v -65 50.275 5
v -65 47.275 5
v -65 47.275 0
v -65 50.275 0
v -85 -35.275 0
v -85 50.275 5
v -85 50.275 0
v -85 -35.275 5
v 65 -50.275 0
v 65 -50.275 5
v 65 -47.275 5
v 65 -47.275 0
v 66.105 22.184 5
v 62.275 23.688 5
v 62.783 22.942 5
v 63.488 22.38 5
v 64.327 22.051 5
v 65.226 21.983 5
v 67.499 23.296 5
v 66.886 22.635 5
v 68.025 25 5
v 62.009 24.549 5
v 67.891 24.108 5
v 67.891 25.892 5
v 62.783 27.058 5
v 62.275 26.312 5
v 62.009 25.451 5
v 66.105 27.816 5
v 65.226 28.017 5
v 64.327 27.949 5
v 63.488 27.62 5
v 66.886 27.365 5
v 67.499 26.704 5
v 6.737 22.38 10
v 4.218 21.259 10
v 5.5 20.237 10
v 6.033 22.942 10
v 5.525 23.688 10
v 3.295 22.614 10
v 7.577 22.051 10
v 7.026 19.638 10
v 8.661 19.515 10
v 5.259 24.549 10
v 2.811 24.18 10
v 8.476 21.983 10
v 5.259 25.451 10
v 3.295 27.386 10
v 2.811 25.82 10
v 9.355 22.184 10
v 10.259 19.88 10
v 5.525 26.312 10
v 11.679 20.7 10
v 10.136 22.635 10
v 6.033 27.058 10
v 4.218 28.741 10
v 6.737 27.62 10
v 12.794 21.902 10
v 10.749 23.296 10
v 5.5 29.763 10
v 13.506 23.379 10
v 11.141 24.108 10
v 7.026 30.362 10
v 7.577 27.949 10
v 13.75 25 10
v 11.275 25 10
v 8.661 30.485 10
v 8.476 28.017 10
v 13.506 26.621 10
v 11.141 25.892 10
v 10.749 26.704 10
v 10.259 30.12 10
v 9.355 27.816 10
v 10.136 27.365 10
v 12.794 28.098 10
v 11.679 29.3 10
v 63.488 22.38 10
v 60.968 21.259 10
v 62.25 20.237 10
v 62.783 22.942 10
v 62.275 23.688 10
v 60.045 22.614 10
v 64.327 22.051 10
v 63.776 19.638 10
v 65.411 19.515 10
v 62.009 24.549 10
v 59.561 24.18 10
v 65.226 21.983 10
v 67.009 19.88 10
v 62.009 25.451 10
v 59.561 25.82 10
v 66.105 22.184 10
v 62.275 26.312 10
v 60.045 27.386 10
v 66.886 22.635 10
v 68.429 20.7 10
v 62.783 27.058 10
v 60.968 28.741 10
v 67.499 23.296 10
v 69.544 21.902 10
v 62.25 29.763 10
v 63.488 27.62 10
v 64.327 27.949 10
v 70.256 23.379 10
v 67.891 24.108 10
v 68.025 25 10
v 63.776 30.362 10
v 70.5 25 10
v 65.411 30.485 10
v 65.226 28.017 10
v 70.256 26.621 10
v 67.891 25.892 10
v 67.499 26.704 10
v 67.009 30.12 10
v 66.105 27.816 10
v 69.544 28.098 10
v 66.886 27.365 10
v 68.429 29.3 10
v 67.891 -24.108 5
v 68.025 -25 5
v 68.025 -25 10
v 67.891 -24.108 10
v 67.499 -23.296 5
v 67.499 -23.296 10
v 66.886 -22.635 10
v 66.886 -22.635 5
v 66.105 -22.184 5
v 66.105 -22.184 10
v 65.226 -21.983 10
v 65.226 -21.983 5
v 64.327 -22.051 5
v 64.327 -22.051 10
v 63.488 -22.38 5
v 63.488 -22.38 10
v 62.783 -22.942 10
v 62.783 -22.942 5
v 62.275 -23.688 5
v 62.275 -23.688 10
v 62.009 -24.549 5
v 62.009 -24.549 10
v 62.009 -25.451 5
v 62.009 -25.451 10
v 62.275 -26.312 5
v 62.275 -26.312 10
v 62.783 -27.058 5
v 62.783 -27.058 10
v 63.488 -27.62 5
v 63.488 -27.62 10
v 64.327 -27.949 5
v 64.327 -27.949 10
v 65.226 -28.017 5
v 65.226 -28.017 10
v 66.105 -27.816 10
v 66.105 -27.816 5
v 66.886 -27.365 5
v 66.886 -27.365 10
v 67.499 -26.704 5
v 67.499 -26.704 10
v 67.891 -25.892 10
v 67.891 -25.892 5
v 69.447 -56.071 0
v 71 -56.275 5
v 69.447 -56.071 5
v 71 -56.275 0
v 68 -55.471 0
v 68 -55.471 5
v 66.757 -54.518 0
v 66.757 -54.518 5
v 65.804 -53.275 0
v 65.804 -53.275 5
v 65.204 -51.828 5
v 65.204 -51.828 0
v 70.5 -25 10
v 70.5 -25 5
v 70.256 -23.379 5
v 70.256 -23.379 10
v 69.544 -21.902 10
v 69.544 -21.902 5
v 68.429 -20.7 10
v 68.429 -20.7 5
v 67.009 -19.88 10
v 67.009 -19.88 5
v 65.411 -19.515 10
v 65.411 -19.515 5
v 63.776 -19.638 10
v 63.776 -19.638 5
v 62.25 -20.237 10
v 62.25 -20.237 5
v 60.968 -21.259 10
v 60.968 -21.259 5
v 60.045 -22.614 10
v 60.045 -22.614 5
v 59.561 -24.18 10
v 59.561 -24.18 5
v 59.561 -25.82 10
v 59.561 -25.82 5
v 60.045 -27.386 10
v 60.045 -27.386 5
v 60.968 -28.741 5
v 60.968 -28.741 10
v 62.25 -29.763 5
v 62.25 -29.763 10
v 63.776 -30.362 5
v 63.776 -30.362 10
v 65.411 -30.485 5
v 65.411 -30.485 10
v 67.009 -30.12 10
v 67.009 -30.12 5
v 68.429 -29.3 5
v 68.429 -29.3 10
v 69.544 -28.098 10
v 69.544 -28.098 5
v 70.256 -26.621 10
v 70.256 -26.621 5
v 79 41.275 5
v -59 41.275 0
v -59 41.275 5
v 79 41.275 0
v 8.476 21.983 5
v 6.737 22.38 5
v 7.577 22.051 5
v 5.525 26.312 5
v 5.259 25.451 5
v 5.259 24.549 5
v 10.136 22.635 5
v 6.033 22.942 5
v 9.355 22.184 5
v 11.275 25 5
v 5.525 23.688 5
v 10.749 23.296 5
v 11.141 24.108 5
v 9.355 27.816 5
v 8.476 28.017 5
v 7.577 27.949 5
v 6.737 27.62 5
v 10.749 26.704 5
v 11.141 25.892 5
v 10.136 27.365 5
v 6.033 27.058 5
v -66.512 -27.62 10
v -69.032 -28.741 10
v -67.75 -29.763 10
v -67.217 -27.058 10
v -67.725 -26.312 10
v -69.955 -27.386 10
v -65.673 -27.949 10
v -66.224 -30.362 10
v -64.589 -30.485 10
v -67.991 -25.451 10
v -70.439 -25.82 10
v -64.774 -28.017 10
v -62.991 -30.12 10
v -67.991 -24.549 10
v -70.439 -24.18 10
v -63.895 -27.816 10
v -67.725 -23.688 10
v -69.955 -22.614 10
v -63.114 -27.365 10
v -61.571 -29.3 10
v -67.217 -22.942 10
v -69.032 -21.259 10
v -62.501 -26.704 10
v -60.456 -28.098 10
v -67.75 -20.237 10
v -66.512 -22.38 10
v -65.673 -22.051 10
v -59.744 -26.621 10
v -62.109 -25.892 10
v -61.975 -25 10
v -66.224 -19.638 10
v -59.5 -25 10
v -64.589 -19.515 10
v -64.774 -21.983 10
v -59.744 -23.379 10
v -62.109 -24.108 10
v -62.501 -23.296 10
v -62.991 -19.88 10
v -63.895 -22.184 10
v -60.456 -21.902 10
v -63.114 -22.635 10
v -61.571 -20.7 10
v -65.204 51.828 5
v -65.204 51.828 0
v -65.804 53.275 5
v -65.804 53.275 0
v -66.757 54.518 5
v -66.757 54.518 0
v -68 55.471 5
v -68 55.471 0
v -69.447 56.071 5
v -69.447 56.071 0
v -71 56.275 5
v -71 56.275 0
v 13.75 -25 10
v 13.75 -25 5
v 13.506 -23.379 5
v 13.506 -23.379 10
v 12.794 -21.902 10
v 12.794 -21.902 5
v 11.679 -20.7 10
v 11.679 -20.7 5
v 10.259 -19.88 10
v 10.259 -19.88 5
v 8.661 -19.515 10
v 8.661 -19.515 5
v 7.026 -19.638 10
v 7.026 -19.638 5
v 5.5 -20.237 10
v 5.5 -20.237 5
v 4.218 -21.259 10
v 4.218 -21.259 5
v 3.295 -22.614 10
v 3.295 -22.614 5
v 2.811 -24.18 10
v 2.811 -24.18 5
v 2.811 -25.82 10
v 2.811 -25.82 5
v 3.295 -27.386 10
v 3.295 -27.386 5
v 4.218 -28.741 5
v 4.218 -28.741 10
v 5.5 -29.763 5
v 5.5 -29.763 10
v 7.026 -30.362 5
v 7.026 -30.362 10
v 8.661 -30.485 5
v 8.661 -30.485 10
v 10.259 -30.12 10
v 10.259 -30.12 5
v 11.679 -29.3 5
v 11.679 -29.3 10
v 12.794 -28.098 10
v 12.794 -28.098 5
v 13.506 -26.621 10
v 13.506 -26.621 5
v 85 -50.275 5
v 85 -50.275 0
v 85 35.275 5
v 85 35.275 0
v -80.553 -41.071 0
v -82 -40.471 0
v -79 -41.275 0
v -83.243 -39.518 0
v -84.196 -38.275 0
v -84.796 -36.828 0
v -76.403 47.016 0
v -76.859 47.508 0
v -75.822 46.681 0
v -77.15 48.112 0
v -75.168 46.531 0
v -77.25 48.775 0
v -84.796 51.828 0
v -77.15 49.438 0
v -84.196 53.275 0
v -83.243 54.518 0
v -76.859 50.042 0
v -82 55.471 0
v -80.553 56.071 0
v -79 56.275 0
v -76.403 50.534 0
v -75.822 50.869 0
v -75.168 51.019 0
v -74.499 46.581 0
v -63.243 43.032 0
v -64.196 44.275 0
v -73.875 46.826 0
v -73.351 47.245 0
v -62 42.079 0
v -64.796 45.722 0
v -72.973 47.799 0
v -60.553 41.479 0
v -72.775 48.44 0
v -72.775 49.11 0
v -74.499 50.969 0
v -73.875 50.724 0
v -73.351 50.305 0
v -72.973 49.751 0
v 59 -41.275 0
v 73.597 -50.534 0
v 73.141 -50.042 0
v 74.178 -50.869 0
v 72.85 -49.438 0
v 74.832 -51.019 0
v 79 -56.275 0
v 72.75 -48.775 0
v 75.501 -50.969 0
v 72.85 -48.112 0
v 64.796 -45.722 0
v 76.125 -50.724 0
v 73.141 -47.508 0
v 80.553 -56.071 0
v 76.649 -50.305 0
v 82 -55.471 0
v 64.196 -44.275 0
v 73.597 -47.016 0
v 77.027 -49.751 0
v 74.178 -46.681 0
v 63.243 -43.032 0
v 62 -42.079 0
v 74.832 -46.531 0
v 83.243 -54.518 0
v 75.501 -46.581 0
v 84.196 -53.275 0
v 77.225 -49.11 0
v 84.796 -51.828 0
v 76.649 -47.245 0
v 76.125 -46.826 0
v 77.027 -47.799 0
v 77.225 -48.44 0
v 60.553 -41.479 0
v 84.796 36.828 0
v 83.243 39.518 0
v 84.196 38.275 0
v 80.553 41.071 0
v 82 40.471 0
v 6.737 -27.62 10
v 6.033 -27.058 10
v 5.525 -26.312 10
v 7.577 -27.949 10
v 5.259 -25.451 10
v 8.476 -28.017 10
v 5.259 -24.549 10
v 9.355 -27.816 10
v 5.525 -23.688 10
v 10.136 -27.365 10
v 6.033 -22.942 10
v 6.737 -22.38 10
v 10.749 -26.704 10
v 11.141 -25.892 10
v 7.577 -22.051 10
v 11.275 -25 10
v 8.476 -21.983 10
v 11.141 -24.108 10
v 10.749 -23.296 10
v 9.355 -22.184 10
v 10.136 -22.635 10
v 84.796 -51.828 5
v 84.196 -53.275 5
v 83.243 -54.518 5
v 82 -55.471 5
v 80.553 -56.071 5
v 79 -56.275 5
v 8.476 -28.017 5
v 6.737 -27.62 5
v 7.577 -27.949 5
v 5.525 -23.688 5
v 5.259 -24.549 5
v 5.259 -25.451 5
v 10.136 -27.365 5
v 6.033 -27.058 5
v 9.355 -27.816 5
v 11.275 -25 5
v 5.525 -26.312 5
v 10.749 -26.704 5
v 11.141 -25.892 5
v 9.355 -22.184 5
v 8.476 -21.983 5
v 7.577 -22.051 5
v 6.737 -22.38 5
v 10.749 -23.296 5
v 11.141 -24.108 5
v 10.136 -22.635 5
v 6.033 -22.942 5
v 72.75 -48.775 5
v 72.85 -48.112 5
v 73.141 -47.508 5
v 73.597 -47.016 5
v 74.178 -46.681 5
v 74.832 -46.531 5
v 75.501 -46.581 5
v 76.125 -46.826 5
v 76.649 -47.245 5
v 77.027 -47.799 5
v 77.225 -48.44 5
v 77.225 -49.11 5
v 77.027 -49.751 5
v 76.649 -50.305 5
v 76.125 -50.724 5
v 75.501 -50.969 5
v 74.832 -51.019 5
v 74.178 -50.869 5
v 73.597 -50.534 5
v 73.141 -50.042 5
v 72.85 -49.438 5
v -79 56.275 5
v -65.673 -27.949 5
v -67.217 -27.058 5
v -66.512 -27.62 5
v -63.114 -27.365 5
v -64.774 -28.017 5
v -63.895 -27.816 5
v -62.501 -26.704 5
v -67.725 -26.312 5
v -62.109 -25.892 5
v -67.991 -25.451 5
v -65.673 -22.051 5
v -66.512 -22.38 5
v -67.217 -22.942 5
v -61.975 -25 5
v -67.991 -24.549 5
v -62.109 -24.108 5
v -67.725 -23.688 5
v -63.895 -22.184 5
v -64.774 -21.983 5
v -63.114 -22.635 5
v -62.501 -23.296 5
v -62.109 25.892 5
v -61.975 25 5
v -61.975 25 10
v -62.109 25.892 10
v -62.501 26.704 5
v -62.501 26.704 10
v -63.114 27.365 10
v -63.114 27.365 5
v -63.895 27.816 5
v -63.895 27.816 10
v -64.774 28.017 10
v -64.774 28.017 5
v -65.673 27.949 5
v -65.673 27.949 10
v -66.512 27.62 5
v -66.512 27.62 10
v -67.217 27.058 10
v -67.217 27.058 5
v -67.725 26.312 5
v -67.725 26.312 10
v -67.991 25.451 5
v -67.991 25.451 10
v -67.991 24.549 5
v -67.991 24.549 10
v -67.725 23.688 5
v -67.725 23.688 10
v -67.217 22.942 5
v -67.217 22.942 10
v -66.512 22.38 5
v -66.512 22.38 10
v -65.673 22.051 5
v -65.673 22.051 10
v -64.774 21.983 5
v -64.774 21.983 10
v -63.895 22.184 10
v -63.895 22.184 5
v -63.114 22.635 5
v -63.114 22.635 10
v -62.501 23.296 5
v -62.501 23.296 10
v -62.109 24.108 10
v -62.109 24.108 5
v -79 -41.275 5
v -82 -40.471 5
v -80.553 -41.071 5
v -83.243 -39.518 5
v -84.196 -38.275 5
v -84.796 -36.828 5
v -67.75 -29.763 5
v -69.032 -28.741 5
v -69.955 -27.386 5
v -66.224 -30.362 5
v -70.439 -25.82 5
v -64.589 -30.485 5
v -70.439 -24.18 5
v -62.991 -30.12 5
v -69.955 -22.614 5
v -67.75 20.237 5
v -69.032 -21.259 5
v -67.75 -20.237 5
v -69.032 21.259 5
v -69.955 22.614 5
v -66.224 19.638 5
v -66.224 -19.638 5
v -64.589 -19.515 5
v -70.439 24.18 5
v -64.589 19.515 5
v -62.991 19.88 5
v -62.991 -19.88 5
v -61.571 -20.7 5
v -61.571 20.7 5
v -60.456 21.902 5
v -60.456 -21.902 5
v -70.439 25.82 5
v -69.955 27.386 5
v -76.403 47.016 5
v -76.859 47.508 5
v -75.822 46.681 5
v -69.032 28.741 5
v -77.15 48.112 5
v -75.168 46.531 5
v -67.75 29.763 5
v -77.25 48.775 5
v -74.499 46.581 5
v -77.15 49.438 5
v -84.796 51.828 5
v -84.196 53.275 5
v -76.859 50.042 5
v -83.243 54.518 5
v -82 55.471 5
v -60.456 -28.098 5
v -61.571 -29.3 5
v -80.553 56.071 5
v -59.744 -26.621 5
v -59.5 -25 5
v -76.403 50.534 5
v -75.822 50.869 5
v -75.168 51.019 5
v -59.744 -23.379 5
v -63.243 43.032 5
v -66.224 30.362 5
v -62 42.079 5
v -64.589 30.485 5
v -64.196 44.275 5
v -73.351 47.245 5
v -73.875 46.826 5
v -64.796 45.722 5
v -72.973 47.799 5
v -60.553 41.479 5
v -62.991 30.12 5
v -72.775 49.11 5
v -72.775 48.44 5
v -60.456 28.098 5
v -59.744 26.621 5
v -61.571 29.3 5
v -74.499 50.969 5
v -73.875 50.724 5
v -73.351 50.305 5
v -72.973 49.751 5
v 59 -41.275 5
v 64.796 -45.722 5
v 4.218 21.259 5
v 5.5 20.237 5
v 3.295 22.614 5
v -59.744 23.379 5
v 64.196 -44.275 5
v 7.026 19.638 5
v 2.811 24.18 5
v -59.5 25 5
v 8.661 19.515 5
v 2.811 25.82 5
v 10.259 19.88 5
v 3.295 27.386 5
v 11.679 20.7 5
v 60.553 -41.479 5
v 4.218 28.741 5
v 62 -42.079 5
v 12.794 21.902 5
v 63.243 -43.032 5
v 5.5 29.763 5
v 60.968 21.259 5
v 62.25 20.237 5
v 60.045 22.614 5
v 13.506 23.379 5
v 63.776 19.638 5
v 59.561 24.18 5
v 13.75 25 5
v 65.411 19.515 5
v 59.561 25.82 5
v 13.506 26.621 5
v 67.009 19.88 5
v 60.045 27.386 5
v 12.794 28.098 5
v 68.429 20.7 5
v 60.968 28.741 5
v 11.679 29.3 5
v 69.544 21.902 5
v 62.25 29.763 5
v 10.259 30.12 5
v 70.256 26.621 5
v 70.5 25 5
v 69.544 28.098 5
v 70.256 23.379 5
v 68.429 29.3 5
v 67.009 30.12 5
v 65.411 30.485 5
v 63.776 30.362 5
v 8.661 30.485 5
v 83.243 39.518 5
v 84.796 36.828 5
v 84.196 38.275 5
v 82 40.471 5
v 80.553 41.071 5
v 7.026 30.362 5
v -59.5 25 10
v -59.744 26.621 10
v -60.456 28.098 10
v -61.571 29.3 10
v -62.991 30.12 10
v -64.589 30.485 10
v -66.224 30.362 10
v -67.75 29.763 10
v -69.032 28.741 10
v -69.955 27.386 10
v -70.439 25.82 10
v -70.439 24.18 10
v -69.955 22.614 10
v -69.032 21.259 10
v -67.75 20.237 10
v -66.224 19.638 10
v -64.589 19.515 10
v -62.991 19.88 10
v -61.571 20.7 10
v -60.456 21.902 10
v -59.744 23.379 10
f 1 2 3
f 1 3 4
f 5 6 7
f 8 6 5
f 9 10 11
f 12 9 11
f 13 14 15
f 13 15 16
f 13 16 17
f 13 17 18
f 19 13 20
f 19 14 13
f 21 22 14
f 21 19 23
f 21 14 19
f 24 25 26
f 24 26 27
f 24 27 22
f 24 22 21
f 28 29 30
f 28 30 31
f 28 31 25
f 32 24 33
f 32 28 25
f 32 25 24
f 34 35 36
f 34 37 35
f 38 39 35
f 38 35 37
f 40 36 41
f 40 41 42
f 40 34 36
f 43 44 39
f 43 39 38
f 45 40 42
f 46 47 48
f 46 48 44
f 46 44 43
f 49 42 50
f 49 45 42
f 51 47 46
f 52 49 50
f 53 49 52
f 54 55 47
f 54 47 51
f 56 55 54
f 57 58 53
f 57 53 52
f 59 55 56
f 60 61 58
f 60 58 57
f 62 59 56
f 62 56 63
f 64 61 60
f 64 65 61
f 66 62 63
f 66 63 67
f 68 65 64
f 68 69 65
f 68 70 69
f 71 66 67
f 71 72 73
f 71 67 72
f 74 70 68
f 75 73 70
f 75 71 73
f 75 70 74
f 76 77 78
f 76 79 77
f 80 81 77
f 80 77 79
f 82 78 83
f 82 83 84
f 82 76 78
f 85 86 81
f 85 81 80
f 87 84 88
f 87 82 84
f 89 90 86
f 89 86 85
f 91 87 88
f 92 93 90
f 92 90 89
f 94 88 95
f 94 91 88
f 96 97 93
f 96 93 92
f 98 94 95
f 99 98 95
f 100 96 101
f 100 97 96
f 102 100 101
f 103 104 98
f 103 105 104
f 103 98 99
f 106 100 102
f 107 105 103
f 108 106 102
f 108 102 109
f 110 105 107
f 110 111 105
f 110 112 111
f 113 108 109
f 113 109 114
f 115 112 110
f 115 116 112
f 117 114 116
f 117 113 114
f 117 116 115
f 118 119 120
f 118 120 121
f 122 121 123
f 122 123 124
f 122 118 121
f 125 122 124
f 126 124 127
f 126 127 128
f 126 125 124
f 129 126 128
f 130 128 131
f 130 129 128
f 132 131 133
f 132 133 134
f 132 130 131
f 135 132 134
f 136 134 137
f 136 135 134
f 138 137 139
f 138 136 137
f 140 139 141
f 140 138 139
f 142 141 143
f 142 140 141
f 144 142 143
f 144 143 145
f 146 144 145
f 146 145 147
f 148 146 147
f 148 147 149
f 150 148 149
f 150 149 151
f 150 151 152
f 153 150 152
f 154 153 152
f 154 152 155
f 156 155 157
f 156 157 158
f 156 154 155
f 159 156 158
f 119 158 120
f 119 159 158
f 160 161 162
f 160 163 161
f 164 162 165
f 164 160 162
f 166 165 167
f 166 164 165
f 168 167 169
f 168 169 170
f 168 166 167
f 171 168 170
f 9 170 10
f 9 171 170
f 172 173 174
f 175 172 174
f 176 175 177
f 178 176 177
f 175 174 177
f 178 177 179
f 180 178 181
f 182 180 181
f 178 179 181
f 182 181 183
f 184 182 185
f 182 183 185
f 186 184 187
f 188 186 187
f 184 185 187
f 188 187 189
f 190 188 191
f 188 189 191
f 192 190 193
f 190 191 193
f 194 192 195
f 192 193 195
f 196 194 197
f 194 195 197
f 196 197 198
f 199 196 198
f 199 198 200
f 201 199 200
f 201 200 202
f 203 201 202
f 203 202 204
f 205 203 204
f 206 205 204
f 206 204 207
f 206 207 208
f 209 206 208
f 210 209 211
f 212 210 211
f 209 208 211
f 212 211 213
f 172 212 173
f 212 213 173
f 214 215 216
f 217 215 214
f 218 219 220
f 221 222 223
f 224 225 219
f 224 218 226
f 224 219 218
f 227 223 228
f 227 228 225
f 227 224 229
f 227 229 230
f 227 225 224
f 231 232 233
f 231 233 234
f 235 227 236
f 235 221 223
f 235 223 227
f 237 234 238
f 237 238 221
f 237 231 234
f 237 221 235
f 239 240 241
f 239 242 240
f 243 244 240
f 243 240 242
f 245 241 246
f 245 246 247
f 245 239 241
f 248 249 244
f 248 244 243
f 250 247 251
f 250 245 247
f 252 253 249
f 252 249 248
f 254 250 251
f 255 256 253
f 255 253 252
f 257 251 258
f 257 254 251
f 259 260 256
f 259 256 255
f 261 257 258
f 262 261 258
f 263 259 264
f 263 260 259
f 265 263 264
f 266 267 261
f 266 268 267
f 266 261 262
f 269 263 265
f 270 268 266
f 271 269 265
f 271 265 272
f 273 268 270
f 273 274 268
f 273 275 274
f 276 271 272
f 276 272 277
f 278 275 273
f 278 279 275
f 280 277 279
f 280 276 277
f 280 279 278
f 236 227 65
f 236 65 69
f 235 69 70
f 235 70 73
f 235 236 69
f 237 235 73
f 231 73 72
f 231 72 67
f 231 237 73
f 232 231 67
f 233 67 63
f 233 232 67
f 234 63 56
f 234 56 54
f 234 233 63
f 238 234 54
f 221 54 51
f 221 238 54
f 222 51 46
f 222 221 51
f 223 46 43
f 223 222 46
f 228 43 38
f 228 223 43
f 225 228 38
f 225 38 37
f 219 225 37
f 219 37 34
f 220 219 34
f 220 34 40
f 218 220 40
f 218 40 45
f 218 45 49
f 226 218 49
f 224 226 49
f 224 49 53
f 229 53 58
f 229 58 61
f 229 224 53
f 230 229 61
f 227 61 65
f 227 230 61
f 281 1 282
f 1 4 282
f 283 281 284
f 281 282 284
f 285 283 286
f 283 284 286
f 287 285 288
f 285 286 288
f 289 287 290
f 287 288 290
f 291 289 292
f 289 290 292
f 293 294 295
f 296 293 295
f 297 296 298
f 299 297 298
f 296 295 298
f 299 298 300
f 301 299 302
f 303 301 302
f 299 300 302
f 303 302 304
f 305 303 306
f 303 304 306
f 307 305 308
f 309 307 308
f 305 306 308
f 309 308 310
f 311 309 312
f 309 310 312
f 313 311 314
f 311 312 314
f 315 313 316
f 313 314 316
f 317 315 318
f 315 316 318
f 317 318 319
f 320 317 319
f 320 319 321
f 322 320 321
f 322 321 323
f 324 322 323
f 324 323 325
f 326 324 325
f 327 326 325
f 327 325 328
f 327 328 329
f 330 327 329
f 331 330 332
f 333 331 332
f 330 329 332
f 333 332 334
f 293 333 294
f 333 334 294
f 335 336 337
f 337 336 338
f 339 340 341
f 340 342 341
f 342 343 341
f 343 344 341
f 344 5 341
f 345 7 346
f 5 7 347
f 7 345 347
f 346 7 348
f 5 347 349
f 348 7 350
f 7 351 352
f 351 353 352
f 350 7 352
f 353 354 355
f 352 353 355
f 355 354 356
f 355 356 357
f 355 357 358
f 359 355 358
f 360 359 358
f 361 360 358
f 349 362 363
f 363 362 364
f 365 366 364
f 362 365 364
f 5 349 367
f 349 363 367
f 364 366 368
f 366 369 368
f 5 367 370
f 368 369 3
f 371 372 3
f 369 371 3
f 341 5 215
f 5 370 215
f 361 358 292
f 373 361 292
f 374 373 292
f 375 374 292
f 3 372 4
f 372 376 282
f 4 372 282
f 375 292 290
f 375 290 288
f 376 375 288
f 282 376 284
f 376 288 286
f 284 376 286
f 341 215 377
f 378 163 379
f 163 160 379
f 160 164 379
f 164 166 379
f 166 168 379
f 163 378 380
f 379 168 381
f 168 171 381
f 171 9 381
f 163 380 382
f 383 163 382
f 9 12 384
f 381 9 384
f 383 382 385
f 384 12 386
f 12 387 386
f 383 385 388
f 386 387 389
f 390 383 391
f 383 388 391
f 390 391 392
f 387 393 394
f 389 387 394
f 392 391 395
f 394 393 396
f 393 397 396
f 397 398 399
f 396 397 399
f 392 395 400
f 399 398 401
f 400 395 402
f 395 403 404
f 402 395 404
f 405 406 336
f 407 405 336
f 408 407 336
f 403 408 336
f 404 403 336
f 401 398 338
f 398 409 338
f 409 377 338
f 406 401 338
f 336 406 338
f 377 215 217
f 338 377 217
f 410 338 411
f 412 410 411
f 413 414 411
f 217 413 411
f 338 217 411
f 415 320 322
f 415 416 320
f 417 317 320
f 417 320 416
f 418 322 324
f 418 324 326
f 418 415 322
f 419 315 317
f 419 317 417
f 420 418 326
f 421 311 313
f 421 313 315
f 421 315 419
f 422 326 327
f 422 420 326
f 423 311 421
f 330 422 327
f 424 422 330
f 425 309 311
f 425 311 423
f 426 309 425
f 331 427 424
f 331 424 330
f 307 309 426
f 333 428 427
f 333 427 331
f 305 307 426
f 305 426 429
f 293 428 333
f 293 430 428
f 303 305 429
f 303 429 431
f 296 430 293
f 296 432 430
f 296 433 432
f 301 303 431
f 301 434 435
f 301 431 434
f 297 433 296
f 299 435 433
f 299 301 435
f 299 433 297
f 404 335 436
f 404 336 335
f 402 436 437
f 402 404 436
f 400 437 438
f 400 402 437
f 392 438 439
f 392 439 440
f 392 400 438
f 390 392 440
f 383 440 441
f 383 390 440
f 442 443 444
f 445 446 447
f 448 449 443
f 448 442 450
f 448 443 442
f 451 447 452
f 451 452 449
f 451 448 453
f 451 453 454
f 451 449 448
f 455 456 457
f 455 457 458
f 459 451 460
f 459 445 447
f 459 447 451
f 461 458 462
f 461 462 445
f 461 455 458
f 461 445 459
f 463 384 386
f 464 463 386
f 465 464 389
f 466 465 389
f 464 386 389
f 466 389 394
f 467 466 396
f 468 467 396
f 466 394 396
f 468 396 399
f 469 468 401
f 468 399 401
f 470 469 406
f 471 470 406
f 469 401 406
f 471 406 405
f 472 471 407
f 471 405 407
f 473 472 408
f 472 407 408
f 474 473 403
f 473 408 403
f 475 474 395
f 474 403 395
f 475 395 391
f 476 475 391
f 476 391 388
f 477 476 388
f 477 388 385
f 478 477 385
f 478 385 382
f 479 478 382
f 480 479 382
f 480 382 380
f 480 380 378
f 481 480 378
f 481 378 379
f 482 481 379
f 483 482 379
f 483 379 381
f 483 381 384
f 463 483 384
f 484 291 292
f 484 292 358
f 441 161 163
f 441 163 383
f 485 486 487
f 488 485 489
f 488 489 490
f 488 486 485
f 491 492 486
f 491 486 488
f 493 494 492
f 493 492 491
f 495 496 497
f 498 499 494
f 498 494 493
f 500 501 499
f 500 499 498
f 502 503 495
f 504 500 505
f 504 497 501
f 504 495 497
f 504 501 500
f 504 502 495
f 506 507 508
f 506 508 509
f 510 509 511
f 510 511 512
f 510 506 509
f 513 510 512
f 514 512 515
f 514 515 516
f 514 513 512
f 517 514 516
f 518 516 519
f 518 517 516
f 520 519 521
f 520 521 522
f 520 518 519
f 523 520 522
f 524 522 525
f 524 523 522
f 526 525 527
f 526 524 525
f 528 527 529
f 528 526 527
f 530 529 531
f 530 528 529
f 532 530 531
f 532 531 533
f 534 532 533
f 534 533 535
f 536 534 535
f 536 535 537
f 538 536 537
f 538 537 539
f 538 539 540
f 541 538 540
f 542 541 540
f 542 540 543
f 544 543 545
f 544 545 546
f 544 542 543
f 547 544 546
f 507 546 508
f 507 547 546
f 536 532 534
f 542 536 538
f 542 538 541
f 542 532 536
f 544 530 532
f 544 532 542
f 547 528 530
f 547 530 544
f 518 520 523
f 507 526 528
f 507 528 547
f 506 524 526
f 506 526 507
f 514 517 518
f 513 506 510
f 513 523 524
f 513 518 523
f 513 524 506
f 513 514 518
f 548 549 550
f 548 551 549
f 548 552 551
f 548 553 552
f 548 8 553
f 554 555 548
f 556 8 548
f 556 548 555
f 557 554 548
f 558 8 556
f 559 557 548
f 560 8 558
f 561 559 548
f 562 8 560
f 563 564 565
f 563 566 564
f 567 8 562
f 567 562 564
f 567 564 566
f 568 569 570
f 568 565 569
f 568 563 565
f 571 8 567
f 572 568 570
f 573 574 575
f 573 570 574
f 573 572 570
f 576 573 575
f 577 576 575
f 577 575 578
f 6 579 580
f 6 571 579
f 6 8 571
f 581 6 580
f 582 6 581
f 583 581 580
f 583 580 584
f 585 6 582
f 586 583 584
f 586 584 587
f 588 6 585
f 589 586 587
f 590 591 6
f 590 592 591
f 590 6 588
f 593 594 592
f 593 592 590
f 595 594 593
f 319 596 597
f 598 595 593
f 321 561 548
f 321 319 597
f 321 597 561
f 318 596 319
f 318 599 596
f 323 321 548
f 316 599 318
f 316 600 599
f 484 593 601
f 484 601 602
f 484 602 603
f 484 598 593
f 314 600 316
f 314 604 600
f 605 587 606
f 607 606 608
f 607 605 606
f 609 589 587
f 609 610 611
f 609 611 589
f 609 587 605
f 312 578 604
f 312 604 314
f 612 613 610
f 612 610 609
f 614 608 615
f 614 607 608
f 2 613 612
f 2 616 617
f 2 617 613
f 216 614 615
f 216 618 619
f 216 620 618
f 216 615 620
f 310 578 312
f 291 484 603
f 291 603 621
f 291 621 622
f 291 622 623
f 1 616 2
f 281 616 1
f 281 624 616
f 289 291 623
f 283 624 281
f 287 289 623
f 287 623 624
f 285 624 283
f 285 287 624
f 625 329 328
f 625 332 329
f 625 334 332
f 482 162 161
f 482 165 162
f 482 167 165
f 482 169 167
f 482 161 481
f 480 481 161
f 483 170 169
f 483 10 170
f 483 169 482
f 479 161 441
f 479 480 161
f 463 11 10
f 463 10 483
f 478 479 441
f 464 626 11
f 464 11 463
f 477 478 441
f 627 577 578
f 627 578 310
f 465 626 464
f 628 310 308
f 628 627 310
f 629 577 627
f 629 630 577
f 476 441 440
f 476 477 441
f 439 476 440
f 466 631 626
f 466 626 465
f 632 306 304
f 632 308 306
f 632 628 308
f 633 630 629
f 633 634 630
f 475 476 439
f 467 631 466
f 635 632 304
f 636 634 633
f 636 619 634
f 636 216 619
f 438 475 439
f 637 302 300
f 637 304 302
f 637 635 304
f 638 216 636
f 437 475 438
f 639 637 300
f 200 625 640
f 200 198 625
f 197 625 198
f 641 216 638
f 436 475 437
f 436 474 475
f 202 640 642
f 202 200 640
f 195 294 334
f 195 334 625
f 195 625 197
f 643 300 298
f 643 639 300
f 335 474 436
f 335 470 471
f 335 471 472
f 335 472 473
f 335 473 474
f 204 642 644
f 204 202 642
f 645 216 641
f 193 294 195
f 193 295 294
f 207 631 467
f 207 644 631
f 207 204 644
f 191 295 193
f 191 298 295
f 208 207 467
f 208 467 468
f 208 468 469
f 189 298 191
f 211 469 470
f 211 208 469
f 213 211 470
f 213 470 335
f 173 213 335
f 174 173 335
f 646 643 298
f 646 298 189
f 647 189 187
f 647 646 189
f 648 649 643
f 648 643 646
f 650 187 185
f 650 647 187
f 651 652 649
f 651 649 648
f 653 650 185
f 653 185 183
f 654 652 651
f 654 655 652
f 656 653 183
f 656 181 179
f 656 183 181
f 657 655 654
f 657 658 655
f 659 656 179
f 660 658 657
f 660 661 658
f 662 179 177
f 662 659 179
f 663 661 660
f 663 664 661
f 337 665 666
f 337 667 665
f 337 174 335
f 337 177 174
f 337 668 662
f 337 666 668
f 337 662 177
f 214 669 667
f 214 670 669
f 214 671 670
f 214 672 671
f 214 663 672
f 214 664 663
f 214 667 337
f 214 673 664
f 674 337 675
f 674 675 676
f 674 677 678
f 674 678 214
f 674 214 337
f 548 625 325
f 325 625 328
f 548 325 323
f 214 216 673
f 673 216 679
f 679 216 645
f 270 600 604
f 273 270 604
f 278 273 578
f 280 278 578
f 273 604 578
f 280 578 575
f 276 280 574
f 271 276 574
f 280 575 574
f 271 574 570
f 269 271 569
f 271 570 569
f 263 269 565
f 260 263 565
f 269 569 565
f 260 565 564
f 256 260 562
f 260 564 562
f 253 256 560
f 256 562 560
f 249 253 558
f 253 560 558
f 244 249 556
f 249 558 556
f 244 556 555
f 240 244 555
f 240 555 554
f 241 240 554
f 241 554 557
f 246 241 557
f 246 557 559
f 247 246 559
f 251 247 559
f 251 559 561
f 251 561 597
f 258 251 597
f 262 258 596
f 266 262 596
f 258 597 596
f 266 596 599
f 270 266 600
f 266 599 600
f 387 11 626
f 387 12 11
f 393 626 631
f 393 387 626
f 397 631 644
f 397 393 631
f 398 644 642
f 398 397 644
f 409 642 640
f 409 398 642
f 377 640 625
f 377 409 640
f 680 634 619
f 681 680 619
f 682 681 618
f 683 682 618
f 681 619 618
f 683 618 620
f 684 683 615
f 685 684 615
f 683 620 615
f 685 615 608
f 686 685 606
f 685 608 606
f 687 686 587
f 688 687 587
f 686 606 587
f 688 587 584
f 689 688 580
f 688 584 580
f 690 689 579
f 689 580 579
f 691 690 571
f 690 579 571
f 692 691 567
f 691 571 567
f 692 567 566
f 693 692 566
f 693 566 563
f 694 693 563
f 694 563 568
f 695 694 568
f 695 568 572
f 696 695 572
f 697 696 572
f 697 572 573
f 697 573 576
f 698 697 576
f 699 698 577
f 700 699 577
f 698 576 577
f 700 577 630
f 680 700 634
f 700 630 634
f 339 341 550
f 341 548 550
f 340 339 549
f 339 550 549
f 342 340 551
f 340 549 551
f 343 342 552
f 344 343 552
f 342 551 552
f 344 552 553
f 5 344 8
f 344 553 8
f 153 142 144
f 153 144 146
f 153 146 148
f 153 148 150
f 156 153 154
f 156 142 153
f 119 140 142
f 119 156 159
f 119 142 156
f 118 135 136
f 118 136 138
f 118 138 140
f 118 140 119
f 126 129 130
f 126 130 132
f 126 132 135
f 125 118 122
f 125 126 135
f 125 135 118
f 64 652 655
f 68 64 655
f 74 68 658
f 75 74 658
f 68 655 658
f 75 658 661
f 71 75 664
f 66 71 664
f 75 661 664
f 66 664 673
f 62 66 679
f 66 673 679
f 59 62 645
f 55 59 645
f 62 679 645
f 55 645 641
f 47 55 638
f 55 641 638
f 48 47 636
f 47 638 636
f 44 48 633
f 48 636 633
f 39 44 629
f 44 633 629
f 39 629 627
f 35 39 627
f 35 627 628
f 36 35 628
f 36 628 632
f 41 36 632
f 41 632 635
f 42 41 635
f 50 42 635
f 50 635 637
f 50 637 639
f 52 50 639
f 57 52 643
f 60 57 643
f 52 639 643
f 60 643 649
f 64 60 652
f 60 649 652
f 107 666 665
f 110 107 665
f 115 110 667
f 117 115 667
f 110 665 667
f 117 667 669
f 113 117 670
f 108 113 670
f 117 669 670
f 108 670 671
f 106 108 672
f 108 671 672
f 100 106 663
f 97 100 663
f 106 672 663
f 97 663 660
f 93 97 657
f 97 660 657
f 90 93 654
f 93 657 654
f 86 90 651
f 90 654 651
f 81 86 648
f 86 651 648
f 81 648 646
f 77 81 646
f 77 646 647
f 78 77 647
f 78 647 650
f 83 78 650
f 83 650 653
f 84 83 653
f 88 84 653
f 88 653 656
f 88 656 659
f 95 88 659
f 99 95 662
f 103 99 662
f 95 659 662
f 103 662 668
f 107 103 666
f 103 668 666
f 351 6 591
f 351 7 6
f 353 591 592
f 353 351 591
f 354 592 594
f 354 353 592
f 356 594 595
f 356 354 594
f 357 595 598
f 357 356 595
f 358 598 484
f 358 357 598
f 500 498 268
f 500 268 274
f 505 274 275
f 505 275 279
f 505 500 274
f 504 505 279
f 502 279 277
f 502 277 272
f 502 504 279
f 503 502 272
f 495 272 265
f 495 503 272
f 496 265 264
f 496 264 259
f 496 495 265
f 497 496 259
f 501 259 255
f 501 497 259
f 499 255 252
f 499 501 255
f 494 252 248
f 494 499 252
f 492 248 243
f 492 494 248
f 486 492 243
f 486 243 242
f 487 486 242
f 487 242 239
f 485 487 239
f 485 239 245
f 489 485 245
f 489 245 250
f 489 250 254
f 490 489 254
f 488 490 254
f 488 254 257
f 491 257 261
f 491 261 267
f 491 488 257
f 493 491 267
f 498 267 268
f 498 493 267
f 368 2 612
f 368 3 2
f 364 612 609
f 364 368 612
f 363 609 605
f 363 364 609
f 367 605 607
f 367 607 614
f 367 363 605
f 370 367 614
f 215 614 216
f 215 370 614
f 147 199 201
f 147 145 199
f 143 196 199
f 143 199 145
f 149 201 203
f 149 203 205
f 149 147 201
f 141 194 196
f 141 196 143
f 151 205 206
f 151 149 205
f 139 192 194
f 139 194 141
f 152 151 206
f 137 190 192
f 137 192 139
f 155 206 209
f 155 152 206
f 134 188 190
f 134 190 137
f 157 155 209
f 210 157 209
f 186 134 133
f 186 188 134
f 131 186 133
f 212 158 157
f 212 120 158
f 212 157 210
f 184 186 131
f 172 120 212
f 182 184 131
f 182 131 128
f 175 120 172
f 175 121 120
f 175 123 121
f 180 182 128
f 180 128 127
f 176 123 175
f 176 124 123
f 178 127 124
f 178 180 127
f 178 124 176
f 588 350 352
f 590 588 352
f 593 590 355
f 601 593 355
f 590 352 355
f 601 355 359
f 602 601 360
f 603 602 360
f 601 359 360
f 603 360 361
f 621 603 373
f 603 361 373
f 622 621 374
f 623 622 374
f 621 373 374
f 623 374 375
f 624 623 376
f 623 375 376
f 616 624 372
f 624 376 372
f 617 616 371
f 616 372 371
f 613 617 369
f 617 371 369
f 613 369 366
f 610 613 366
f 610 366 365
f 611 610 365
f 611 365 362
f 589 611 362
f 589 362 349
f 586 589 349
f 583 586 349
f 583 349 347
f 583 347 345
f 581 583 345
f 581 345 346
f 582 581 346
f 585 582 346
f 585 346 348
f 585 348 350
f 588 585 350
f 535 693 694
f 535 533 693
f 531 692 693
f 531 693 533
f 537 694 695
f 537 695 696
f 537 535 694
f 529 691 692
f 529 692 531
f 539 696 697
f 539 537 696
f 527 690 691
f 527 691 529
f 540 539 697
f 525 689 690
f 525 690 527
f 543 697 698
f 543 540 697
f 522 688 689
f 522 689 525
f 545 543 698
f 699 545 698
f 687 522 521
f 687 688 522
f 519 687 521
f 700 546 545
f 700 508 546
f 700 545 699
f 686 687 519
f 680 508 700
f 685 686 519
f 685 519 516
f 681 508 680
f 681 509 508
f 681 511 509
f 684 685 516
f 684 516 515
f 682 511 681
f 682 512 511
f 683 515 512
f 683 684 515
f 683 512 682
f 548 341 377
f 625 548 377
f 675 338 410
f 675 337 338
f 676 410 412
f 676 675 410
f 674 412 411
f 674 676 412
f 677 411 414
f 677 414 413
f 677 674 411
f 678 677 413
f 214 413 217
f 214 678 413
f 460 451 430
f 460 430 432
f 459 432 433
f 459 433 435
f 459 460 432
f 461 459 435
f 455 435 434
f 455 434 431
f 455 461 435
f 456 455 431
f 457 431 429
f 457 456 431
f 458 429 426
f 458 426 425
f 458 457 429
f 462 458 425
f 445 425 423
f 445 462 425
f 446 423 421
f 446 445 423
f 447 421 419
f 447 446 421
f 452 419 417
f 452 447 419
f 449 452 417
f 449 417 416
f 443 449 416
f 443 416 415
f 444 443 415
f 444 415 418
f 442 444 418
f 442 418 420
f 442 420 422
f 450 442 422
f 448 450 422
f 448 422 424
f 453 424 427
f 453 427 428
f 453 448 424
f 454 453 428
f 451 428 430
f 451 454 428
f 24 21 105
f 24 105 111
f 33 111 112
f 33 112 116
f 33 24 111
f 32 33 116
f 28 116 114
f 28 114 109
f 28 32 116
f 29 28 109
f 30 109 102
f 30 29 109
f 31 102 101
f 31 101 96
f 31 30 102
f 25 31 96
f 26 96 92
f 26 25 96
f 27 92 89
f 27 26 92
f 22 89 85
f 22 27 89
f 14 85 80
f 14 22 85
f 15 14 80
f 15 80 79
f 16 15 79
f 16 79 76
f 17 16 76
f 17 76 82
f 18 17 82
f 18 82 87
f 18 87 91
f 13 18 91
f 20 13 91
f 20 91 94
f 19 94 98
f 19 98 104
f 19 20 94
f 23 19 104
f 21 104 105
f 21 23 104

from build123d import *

# Parameters (mm, degrees)
SKETCH1_W            = 170
SKETCH1_H            = 82.55
BOSS_EXTRUDE1_DEPTH  = 5
SKETCH2_R            = 5.5
SKETCH2_R_2          = 3.025
BOSS_EXTRUDE2_DEPTH  = 5
SKETCH3_W            = 20
SKETCH3_H            = 15
BOSS_EXTRUDE3_DEPTH  = 5
FILLET1_R            = 6
M4_CLEARANCE_HOLE1_D = 4.5


with BuildPart() as part:
    # Sketch1 → Boss-Extrude1 (new body)
    with BuildSketch(Plane.XY):
        Rectangle(SKETCH1_W, SKETCH1_H)
    extrude(amount=BOSS_EXTRUDE1_DEPTH)

    # Sketch2 → Boss-Extrude2 (add)
    with BuildSketch(Plane.XY.offset(5)):
        with Locations((65, 25)):
            Circle(SKETCH2_R)
        with Locations((65, 25)):
            Circle(SKETCH2_R_2, mode=Mode.SUBTRACT)
        with Locations((8.25, 25)):
            Circle(SKETCH2_R)
        with Locations((8.25, 25)):
            Circle(SKETCH2_R_2, mode=Mode.SUBTRACT)
        with Locations((-65, 25)):
            Circle(SKETCH2_R)
        with Locations((-65, 25)):
            Circle(SKETCH2_R_2, mode=Mode.SUBTRACT)
        with Locations((-65, -25)):
            Circle(SKETCH2_R)
        with Locations((-65, -25)):
            Circle(SKETCH2_R_2, mode=Mode.SUBTRACT)
        with Locations((8.25, -25)):
            Circle(SKETCH2_R)
        with Locations((8.25, -25)):
            Circle(SKETCH2_R_2, mode=Mode.SUBTRACT)
        with Locations((65, -25)):
            Circle(SKETCH2_R)
        with Locations((65, -25)):
            Circle(SKETCH2_R_2, mode=Mode.SUBTRACT)
    extrude(amount=BOSS_EXTRUDE2_DEPTH)

    # Sketch3 → Boss-Extrude3 (add)
    with BuildSketch(Plane.XY.offset(5)):
        Polygon((-65, 56.275), (-85, 41.275), (-65, 41.275), align=None)
        Polygon((-85, 56.275), (-85, 41.275), (-65, 56.275), align=None)
        with Locations((75, -48.775)):
            Rectangle(SKETCH3_W, SKETCH3_H)
    extrude(amount=-BOSS_EXTRUDE3_DEPTH)

    # Fillet1
    fillet1_edges = [part.edges().sort_by_distance(p)[0] for p in [
        (-85, 56.275, 2.5),
        (-65, 56.275, 2.5),
        (-65, 41.275, 2.5),
        (65, -56.275, 2.5),
        (65, -41.275, 2.5),
        (85, -56.275, 2.5),
        (-85, -41.275, 2.5),
        (85, 41.275, 2.5),
    ]]
    fillet(fillet1_edges, radius=FILLET1_R)

    # M4 Clearance Hole1 (through all)
    with Locations(Plane.XY.offset(5)):
        with Locations((-75, 48.775), (75, -48.775)):
            Hole(M4_CLEARANCE_HOLE1_D / 2)


solid = part.part
